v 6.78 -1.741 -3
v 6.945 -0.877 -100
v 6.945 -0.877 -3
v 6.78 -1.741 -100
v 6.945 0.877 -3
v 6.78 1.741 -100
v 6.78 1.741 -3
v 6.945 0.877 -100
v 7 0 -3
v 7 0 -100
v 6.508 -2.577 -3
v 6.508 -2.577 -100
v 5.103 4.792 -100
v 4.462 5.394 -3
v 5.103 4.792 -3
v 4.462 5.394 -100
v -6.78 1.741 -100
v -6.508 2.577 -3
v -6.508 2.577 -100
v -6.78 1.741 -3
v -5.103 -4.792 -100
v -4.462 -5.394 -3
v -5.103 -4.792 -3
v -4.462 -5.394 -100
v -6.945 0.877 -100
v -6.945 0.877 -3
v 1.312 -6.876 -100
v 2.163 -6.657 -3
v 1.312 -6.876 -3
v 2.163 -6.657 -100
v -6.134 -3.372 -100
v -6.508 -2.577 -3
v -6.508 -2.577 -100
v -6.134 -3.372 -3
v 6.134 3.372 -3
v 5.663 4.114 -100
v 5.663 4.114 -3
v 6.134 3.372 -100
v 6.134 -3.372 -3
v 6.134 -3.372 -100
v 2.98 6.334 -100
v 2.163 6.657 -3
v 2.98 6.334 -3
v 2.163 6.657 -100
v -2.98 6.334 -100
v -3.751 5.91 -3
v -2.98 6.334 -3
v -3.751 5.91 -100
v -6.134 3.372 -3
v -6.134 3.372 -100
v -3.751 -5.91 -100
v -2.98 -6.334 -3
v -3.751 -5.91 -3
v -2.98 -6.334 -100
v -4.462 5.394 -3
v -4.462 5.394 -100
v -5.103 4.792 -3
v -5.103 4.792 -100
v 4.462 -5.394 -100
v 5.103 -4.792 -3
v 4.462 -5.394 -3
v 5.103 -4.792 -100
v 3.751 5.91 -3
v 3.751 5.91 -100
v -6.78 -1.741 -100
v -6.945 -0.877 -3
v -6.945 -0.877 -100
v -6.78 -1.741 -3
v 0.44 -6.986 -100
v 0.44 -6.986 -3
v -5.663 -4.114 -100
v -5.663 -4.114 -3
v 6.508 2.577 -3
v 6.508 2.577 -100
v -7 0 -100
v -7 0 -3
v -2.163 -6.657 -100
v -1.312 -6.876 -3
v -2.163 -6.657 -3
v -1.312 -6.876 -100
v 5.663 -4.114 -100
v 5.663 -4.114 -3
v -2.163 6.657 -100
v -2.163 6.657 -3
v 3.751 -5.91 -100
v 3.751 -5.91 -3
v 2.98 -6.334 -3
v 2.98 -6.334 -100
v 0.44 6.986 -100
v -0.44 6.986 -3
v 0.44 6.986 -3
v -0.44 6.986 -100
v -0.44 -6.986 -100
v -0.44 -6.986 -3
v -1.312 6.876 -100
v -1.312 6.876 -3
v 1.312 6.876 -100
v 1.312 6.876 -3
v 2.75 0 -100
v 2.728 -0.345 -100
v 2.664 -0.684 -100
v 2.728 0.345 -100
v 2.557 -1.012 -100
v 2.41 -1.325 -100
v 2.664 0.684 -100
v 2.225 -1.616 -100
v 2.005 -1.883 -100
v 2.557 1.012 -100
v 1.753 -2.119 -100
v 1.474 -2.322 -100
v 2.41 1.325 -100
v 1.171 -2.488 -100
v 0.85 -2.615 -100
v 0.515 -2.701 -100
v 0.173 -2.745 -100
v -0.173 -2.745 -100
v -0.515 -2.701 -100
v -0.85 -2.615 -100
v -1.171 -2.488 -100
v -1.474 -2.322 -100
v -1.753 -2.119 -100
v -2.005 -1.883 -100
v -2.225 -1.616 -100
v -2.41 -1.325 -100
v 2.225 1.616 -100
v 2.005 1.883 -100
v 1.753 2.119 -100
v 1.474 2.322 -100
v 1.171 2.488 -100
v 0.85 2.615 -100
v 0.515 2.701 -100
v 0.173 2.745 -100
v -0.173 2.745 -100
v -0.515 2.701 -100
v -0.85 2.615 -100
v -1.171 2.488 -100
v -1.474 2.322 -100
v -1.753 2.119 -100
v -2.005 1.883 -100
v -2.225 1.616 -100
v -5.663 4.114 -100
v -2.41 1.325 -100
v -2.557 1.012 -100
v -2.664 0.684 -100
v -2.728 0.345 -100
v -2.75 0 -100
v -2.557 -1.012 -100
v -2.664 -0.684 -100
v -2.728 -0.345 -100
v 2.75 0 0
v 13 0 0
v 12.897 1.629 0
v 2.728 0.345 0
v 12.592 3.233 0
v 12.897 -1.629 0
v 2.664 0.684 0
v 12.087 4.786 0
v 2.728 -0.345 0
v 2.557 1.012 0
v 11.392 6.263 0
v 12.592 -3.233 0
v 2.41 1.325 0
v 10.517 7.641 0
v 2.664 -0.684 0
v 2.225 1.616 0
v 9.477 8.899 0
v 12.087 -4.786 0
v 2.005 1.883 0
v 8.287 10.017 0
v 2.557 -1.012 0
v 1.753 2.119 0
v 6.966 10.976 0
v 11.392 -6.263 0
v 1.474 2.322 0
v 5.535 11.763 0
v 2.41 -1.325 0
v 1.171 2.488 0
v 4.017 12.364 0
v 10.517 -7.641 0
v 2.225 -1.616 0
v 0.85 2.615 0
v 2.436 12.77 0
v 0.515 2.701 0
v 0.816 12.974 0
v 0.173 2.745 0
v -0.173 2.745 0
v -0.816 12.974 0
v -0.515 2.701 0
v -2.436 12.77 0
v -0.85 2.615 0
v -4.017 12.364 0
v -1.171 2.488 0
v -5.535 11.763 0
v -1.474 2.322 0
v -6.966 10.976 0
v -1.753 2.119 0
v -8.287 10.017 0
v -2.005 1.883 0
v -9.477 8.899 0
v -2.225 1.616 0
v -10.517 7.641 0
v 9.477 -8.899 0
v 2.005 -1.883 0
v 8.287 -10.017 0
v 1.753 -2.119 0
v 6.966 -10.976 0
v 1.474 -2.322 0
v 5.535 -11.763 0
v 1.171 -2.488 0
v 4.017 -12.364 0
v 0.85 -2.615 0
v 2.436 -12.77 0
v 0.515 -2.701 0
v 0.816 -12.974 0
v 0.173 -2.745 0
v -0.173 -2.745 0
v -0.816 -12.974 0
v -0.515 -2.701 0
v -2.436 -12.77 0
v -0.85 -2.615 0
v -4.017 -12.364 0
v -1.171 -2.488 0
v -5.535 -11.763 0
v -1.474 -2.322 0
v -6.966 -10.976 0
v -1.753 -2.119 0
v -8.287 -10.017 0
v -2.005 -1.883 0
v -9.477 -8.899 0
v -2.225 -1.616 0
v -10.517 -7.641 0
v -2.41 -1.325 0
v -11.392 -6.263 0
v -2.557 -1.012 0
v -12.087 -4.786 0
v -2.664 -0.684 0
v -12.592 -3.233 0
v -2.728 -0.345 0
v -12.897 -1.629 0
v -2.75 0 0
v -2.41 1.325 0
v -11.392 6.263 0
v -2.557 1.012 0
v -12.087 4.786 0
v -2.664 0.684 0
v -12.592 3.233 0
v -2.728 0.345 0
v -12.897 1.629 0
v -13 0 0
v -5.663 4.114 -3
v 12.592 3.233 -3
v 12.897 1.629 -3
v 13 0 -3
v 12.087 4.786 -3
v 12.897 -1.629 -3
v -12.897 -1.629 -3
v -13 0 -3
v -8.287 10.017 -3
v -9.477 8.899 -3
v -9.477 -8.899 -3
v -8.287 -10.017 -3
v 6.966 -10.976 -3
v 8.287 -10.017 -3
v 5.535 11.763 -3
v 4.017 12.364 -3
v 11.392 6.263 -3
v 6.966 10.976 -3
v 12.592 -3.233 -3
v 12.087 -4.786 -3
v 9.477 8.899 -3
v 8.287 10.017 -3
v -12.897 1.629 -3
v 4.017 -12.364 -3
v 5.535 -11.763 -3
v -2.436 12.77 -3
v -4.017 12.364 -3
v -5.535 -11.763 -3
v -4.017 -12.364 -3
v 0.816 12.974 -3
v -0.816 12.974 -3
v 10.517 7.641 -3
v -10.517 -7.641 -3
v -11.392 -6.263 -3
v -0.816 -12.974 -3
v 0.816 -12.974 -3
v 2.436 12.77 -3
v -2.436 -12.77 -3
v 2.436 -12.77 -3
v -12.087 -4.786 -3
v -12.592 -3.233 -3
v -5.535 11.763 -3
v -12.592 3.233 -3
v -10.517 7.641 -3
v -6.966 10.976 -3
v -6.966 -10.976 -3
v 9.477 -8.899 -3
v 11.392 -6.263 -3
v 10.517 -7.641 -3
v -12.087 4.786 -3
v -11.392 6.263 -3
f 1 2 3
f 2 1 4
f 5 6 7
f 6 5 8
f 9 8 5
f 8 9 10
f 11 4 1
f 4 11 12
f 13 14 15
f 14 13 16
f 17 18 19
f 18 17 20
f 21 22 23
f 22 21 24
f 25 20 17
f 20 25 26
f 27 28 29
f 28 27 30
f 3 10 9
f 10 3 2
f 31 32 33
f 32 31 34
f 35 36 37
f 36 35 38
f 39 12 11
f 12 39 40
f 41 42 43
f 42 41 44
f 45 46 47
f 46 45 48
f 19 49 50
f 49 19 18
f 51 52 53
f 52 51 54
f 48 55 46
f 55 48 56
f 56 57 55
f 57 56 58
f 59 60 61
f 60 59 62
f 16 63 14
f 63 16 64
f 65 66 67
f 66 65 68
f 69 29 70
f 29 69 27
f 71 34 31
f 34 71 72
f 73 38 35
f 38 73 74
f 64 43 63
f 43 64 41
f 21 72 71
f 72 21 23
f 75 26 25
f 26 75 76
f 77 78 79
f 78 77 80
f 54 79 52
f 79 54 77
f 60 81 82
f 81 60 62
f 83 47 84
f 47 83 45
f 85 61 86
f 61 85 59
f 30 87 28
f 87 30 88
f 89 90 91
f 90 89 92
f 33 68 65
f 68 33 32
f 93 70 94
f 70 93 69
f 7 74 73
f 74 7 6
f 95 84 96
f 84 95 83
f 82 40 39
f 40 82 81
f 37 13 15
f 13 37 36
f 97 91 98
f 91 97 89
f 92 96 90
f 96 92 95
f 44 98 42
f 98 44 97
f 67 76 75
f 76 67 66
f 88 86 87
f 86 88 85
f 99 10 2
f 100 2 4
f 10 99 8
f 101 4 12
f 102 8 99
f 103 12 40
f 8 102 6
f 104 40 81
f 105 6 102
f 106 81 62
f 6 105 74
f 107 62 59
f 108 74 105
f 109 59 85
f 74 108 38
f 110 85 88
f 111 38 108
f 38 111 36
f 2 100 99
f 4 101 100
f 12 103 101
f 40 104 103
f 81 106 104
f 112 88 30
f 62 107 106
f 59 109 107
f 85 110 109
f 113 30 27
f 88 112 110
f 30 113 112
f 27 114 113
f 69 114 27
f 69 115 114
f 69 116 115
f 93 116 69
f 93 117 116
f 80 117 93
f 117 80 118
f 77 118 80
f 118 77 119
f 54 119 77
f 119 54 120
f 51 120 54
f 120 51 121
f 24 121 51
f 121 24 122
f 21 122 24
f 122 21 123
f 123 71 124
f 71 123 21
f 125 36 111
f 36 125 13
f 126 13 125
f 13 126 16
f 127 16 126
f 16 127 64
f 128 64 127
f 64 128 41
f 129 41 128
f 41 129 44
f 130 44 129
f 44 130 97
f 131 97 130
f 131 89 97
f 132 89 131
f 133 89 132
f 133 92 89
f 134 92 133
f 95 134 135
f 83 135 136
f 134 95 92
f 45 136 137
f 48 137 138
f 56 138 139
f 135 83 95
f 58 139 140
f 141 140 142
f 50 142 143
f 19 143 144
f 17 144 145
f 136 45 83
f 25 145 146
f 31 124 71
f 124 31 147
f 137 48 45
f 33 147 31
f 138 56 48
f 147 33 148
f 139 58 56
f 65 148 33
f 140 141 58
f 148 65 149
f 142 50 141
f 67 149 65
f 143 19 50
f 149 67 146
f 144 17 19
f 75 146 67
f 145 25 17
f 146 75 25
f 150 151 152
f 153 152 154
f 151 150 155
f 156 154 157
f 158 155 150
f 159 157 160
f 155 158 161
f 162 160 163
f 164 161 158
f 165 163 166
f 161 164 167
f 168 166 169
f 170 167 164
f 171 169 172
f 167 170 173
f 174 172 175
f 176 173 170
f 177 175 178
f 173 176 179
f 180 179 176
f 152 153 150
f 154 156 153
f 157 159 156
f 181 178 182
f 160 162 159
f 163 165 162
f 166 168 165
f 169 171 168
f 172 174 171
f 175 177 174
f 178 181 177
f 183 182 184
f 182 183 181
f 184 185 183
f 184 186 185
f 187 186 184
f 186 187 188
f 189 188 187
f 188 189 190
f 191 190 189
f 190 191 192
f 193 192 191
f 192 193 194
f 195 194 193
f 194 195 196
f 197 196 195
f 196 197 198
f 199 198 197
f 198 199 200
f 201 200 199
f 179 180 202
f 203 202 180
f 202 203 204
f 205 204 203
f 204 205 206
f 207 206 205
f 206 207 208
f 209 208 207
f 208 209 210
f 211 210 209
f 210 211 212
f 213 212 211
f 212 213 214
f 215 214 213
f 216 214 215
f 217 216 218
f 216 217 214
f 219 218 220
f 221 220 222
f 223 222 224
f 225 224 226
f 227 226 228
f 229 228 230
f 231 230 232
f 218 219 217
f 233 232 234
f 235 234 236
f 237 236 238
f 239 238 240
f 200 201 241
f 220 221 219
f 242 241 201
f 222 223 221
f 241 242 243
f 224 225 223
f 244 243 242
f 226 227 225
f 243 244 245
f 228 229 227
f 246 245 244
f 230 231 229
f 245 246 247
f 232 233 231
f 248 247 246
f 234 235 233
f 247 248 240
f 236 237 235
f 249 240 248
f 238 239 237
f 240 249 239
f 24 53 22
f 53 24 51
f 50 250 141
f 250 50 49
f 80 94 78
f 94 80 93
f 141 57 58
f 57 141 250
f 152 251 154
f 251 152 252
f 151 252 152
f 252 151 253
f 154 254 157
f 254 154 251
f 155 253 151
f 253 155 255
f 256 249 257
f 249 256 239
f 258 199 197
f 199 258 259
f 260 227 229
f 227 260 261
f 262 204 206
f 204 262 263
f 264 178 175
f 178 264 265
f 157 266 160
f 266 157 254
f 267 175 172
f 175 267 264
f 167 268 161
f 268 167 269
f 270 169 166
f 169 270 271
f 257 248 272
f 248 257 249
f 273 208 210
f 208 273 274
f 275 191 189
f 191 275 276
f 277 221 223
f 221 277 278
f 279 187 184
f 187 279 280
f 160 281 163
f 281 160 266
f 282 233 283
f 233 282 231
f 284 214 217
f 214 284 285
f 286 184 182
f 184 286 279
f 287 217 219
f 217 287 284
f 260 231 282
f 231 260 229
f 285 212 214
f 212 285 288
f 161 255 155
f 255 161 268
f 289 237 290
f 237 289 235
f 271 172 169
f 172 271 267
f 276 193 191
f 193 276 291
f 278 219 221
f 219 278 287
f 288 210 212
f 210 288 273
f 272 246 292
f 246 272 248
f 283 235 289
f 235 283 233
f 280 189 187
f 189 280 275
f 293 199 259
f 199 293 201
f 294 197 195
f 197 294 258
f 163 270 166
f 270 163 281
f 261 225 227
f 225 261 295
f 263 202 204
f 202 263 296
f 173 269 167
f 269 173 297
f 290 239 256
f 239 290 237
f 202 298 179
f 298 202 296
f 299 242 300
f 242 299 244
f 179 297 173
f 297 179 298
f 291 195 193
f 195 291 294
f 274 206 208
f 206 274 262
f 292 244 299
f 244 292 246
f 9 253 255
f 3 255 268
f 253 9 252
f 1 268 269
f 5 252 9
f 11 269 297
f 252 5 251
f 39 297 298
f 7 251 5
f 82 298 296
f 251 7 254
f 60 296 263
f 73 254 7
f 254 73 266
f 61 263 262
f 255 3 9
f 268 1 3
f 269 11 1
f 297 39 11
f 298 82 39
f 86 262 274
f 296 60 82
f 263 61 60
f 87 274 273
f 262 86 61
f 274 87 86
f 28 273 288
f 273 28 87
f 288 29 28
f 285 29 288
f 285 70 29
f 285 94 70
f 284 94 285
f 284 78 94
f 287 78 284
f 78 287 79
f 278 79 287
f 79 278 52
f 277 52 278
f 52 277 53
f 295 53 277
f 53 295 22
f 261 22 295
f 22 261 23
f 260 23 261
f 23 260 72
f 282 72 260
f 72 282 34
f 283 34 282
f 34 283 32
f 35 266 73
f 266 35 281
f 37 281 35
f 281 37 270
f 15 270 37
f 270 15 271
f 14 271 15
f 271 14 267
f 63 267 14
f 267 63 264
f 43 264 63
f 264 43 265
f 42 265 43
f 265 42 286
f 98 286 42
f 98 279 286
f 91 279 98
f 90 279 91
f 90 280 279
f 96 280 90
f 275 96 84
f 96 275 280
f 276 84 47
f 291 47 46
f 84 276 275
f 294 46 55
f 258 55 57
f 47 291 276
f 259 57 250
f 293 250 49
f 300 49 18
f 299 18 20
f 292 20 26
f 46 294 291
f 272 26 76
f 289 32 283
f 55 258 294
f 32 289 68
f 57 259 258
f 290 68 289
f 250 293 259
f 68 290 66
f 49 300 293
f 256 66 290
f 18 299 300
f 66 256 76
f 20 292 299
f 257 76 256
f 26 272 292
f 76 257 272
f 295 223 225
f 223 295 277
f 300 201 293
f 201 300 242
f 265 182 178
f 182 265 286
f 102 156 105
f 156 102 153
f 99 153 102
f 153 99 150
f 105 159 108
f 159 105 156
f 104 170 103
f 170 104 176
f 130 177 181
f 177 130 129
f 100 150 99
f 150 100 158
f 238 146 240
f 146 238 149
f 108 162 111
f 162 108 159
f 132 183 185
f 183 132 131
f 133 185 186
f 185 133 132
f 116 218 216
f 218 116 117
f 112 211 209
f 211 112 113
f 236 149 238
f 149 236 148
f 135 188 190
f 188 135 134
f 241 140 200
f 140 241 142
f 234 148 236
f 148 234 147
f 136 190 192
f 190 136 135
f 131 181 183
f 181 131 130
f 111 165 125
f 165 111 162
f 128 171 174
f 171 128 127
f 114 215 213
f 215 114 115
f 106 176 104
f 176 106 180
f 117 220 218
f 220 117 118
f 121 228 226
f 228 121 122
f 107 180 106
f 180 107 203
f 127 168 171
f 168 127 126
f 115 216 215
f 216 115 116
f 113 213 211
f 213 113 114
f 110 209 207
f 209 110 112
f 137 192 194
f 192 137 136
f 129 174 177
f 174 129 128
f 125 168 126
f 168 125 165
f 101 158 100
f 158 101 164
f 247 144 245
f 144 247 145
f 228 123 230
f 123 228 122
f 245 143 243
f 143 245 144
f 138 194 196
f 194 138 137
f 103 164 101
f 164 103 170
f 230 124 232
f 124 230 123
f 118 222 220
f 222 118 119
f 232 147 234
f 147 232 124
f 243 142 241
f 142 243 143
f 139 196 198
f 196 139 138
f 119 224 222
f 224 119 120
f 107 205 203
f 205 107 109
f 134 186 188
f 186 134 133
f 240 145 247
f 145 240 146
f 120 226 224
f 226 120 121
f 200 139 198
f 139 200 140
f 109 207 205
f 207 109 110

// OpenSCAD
$fn = 50;


difference() {
	union() {
		translate(v = [0, 0, -100.0000000000]) {
			cylinder(h = 100, r = 7.0000000000);
		}
		translate(v = [0, 0, -3.0000000000]) {
			cylinder(h = 3, r = 13.0000000000);
		}
	}
	union() {
		#translate(v = [0, 0, -100]) {
			cylinder(h = 100, r = 2.7500000000);
		}
	}
}
